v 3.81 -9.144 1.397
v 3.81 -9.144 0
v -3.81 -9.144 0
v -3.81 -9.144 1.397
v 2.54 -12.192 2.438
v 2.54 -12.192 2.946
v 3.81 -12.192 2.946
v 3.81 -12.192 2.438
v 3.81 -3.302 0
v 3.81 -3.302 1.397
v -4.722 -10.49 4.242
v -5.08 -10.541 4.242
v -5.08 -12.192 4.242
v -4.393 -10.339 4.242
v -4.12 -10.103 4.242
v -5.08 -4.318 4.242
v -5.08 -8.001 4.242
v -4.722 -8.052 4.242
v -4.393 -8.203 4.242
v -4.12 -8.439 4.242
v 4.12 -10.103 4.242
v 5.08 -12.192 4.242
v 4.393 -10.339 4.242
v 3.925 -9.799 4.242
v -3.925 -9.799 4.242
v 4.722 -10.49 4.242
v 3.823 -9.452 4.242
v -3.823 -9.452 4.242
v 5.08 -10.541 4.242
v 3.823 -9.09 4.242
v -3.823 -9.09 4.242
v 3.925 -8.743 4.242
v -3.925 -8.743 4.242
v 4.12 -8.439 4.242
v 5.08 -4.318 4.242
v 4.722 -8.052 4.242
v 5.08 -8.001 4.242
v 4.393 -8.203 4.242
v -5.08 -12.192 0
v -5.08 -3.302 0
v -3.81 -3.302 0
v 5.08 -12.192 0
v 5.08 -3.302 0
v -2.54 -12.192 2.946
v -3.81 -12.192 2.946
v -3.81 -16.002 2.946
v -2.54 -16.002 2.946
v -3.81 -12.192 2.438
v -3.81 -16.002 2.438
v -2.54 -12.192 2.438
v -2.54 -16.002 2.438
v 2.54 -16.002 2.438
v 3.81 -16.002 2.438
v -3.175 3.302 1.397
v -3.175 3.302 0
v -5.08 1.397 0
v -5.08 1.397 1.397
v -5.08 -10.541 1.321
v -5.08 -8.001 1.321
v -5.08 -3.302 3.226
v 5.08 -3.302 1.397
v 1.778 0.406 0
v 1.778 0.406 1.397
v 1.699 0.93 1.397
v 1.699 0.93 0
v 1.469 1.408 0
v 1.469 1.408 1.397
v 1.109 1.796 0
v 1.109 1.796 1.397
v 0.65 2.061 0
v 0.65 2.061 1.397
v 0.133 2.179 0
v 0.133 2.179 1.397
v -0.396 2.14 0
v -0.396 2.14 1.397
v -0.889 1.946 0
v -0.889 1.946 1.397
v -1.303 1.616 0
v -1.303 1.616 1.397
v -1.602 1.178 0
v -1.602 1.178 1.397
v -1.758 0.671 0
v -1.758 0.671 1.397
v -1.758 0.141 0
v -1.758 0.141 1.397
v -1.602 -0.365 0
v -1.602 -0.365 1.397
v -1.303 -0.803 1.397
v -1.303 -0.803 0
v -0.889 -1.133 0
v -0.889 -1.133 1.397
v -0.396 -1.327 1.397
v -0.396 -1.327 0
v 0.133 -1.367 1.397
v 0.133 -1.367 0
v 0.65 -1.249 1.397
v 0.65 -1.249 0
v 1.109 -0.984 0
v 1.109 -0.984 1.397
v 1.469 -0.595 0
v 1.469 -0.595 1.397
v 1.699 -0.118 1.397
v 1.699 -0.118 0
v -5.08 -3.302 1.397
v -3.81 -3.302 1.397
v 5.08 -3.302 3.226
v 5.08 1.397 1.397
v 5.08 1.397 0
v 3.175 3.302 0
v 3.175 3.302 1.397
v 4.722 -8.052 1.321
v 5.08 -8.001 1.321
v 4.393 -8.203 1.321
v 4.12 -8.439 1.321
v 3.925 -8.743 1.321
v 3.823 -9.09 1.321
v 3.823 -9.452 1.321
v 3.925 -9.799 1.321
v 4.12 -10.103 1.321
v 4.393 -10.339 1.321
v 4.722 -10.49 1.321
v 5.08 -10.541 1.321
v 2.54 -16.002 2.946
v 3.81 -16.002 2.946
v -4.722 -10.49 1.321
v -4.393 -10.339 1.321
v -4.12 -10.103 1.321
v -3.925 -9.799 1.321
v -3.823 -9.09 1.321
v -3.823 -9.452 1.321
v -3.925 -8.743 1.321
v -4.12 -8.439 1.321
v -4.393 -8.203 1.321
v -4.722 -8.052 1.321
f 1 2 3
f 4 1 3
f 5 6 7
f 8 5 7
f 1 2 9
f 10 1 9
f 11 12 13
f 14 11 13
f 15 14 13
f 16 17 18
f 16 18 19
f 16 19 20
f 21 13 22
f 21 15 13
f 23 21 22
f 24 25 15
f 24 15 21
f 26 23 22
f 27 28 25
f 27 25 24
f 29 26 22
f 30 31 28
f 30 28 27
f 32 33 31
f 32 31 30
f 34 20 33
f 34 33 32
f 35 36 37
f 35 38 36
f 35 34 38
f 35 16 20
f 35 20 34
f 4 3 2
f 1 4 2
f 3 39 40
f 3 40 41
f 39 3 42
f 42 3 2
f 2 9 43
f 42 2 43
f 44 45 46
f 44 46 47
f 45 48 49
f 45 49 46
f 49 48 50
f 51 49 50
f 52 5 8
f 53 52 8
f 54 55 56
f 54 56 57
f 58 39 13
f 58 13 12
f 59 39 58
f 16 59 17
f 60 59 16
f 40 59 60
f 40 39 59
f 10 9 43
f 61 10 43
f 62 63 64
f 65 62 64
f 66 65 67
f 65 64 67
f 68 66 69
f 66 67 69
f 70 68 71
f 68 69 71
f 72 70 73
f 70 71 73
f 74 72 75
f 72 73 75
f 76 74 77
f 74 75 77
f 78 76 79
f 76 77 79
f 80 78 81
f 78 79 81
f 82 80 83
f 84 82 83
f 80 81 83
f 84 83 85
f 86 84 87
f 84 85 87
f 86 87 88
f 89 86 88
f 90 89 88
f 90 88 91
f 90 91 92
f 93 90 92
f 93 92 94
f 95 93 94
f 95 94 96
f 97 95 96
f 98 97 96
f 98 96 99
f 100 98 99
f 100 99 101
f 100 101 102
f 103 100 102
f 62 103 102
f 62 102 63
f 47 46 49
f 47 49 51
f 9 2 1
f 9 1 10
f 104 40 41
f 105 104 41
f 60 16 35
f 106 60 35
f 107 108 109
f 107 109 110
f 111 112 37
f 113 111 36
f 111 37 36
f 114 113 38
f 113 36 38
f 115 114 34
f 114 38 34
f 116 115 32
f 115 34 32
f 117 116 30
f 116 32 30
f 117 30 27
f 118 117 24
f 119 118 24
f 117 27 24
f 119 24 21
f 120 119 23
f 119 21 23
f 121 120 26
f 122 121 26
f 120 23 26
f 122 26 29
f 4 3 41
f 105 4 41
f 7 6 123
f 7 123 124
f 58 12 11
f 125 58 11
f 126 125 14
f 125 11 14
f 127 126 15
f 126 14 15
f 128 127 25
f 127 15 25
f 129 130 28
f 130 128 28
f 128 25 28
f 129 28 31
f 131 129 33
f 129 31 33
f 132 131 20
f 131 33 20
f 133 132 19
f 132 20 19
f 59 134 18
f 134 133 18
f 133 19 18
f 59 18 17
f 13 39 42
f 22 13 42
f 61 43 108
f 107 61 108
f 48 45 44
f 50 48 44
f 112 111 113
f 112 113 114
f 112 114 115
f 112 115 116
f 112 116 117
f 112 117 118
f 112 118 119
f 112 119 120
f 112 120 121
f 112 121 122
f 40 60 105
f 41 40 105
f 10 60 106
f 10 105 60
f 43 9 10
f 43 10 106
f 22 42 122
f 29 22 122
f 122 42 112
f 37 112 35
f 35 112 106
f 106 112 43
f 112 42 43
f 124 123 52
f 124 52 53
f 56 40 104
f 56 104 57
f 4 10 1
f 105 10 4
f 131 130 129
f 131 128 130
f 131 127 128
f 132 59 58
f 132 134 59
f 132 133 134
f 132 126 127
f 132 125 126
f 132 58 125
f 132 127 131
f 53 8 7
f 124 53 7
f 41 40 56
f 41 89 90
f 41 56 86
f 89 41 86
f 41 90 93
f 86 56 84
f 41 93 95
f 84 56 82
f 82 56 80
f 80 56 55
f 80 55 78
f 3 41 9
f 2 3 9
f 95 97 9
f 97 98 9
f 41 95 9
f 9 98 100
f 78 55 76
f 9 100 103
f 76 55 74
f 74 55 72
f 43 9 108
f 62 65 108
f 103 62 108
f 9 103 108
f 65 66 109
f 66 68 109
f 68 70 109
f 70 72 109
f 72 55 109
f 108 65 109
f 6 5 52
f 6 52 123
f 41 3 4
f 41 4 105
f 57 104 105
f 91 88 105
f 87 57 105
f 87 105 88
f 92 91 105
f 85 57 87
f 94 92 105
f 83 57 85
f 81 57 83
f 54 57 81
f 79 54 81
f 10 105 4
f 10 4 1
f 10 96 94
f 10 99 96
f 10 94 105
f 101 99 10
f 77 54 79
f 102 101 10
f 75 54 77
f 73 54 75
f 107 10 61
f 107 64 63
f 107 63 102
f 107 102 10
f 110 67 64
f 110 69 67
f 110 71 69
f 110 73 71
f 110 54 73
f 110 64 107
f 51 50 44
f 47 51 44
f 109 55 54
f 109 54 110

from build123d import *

# Parameters (mm, degrees)
SKETCH2_W             = 10.16
SKETCH2_H             = 6.604
SKETCH2_W_2           = 7.62
SKETCH2_H_2           = 5.842
BOSS_EXTRUDE1_DEPTH   = 1.397
SKETCH3_R             = 1.778
CUT_EXTRUDE1_DEPTH    = 11.553233865
SKETCH4_W             = 10.16
SKETCH4_H             = 8.89
BOSS_EXTRUDE2_DEPTH   = 4.2418
SKETCH7_W             = 7.62
SKETCH7_H             = 5.842
CUT_EXTRUDE3_DEPTH    = 1.397
SKETCH8_W             = 1.27
SKETCH8_H             = 0.508
BOSS_EXTRUDE3_DEPTH   = 3.81
BOSS_EXTRUDE3_2_DEPTH = 3.81
CHAMFER1_SIZE         = 1.905
CHAMFER2_SIZE         = 1.016
SKETCH10_R            = 1.27
CUT_EXTRUDE4_DEPTH    = 2.921


with BuildPart() as part:
    # Sketch2 → Boss-Extrude1 (new body)
    with BuildSketch(Plane.XY):
        Rectangle(SKETCH2_W, SKETCH2_H)
        with Locations((0, -6.223)):
            Rectangle(SKETCH2_W_2, SKETCH2_H_2)
    extrude(amount=BOSS_EXTRUDE1_DEPTH)

    # Sketch3 → Cut-Extrude1 (cut, through all)
    with BuildSketch(Plane.XY.offset(1.397)):
        with Locations((0, 0.4064)):
            Circle(SKETCH3_R)
    extrude(amount=-CUT_EXTRUDE1_DEPTH, mode=Mode.SUBTRACT)

    # Chamfer1
    chamfer1_edges = [part.edges().sort_by_distance(p)[0] for p in [
        (-5.08, 3.302, 0.6985),
        (5.08, 3.302, 0.6985),
    ]]
    chamfer(chamfer1_edges, length=CHAMFER1_SIZE)


with BuildPart() as body_2:
    # Sketch4 → Boss-Extrude2 (new body)
    with BuildSketch(Plane.XY):
        with Locations((0, -7.747)):
            Rectangle(SKETCH4_W, SKETCH4_H)
    extrude(amount=BOSS_EXTRUDE2_DEPTH)

    # Sketch7 → Cut-Extrude3 (cut)
    with BuildSketch(Plane(origin=(0, 0, 0), x_dir=(-1, 0, 0), z_dir=(0, 0, -1))):
        with Locations((0, -6.223)):
            Rectangle(SKETCH7_W, SKETCH7_H)
    extrude(amount=-CUT_EXTRUDE3_DEPTH, mode=Mode.SUBTRACT)

    # Chamfer2
    chamfer2_edges = [body_2.edges().sort_by_distance(p)[0] for p in [
        (0, -3.302, 4.2418),
    ]]
    chamfer(chamfer2_edges, length=CHAMFER2_SIZE)

    # Sketch10 → Cut-Extrude4 (cut)
    with BuildSketch(Plane.XY.offset(4.2418)):
        with Locations((5.08, -9.271)):
            Circle(SKETCH10_R)
        with Locations((-5.08, -9.271)):
            Circle(SKETCH10_R)
    extrude(amount=-CUT_EXTRUDE4_DEPTH, mode=Mode.SUBTRACT)


with BuildPart() as body_3:
    # Sketch8 → Boss-Extrude3 (new body)
    with BuildSketch(Plane.XZ.offset(12.192)):
        with Locations((-3.175, 2.6924)):
            Rectangle(SKETCH8_W, SKETCH8_H)
    extrude(amount=BOSS_EXTRUDE3_DEPTH)


with BuildPart() as body_4:
    # Sketch8 → Boss-Extrude3 2 (new body)
    with BuildSketch(Plane.XZ.offset(12.192)):
        with Locations((3.175, 2.6924)):
            Rectangle(SKETCH8_W, SKETCH8_H)
    extrude(amount=BOSS_EXTRUDE3_2_DEPTH)


solid = Compound([part.part, body_2.part, body_3.part, body_4.part])
